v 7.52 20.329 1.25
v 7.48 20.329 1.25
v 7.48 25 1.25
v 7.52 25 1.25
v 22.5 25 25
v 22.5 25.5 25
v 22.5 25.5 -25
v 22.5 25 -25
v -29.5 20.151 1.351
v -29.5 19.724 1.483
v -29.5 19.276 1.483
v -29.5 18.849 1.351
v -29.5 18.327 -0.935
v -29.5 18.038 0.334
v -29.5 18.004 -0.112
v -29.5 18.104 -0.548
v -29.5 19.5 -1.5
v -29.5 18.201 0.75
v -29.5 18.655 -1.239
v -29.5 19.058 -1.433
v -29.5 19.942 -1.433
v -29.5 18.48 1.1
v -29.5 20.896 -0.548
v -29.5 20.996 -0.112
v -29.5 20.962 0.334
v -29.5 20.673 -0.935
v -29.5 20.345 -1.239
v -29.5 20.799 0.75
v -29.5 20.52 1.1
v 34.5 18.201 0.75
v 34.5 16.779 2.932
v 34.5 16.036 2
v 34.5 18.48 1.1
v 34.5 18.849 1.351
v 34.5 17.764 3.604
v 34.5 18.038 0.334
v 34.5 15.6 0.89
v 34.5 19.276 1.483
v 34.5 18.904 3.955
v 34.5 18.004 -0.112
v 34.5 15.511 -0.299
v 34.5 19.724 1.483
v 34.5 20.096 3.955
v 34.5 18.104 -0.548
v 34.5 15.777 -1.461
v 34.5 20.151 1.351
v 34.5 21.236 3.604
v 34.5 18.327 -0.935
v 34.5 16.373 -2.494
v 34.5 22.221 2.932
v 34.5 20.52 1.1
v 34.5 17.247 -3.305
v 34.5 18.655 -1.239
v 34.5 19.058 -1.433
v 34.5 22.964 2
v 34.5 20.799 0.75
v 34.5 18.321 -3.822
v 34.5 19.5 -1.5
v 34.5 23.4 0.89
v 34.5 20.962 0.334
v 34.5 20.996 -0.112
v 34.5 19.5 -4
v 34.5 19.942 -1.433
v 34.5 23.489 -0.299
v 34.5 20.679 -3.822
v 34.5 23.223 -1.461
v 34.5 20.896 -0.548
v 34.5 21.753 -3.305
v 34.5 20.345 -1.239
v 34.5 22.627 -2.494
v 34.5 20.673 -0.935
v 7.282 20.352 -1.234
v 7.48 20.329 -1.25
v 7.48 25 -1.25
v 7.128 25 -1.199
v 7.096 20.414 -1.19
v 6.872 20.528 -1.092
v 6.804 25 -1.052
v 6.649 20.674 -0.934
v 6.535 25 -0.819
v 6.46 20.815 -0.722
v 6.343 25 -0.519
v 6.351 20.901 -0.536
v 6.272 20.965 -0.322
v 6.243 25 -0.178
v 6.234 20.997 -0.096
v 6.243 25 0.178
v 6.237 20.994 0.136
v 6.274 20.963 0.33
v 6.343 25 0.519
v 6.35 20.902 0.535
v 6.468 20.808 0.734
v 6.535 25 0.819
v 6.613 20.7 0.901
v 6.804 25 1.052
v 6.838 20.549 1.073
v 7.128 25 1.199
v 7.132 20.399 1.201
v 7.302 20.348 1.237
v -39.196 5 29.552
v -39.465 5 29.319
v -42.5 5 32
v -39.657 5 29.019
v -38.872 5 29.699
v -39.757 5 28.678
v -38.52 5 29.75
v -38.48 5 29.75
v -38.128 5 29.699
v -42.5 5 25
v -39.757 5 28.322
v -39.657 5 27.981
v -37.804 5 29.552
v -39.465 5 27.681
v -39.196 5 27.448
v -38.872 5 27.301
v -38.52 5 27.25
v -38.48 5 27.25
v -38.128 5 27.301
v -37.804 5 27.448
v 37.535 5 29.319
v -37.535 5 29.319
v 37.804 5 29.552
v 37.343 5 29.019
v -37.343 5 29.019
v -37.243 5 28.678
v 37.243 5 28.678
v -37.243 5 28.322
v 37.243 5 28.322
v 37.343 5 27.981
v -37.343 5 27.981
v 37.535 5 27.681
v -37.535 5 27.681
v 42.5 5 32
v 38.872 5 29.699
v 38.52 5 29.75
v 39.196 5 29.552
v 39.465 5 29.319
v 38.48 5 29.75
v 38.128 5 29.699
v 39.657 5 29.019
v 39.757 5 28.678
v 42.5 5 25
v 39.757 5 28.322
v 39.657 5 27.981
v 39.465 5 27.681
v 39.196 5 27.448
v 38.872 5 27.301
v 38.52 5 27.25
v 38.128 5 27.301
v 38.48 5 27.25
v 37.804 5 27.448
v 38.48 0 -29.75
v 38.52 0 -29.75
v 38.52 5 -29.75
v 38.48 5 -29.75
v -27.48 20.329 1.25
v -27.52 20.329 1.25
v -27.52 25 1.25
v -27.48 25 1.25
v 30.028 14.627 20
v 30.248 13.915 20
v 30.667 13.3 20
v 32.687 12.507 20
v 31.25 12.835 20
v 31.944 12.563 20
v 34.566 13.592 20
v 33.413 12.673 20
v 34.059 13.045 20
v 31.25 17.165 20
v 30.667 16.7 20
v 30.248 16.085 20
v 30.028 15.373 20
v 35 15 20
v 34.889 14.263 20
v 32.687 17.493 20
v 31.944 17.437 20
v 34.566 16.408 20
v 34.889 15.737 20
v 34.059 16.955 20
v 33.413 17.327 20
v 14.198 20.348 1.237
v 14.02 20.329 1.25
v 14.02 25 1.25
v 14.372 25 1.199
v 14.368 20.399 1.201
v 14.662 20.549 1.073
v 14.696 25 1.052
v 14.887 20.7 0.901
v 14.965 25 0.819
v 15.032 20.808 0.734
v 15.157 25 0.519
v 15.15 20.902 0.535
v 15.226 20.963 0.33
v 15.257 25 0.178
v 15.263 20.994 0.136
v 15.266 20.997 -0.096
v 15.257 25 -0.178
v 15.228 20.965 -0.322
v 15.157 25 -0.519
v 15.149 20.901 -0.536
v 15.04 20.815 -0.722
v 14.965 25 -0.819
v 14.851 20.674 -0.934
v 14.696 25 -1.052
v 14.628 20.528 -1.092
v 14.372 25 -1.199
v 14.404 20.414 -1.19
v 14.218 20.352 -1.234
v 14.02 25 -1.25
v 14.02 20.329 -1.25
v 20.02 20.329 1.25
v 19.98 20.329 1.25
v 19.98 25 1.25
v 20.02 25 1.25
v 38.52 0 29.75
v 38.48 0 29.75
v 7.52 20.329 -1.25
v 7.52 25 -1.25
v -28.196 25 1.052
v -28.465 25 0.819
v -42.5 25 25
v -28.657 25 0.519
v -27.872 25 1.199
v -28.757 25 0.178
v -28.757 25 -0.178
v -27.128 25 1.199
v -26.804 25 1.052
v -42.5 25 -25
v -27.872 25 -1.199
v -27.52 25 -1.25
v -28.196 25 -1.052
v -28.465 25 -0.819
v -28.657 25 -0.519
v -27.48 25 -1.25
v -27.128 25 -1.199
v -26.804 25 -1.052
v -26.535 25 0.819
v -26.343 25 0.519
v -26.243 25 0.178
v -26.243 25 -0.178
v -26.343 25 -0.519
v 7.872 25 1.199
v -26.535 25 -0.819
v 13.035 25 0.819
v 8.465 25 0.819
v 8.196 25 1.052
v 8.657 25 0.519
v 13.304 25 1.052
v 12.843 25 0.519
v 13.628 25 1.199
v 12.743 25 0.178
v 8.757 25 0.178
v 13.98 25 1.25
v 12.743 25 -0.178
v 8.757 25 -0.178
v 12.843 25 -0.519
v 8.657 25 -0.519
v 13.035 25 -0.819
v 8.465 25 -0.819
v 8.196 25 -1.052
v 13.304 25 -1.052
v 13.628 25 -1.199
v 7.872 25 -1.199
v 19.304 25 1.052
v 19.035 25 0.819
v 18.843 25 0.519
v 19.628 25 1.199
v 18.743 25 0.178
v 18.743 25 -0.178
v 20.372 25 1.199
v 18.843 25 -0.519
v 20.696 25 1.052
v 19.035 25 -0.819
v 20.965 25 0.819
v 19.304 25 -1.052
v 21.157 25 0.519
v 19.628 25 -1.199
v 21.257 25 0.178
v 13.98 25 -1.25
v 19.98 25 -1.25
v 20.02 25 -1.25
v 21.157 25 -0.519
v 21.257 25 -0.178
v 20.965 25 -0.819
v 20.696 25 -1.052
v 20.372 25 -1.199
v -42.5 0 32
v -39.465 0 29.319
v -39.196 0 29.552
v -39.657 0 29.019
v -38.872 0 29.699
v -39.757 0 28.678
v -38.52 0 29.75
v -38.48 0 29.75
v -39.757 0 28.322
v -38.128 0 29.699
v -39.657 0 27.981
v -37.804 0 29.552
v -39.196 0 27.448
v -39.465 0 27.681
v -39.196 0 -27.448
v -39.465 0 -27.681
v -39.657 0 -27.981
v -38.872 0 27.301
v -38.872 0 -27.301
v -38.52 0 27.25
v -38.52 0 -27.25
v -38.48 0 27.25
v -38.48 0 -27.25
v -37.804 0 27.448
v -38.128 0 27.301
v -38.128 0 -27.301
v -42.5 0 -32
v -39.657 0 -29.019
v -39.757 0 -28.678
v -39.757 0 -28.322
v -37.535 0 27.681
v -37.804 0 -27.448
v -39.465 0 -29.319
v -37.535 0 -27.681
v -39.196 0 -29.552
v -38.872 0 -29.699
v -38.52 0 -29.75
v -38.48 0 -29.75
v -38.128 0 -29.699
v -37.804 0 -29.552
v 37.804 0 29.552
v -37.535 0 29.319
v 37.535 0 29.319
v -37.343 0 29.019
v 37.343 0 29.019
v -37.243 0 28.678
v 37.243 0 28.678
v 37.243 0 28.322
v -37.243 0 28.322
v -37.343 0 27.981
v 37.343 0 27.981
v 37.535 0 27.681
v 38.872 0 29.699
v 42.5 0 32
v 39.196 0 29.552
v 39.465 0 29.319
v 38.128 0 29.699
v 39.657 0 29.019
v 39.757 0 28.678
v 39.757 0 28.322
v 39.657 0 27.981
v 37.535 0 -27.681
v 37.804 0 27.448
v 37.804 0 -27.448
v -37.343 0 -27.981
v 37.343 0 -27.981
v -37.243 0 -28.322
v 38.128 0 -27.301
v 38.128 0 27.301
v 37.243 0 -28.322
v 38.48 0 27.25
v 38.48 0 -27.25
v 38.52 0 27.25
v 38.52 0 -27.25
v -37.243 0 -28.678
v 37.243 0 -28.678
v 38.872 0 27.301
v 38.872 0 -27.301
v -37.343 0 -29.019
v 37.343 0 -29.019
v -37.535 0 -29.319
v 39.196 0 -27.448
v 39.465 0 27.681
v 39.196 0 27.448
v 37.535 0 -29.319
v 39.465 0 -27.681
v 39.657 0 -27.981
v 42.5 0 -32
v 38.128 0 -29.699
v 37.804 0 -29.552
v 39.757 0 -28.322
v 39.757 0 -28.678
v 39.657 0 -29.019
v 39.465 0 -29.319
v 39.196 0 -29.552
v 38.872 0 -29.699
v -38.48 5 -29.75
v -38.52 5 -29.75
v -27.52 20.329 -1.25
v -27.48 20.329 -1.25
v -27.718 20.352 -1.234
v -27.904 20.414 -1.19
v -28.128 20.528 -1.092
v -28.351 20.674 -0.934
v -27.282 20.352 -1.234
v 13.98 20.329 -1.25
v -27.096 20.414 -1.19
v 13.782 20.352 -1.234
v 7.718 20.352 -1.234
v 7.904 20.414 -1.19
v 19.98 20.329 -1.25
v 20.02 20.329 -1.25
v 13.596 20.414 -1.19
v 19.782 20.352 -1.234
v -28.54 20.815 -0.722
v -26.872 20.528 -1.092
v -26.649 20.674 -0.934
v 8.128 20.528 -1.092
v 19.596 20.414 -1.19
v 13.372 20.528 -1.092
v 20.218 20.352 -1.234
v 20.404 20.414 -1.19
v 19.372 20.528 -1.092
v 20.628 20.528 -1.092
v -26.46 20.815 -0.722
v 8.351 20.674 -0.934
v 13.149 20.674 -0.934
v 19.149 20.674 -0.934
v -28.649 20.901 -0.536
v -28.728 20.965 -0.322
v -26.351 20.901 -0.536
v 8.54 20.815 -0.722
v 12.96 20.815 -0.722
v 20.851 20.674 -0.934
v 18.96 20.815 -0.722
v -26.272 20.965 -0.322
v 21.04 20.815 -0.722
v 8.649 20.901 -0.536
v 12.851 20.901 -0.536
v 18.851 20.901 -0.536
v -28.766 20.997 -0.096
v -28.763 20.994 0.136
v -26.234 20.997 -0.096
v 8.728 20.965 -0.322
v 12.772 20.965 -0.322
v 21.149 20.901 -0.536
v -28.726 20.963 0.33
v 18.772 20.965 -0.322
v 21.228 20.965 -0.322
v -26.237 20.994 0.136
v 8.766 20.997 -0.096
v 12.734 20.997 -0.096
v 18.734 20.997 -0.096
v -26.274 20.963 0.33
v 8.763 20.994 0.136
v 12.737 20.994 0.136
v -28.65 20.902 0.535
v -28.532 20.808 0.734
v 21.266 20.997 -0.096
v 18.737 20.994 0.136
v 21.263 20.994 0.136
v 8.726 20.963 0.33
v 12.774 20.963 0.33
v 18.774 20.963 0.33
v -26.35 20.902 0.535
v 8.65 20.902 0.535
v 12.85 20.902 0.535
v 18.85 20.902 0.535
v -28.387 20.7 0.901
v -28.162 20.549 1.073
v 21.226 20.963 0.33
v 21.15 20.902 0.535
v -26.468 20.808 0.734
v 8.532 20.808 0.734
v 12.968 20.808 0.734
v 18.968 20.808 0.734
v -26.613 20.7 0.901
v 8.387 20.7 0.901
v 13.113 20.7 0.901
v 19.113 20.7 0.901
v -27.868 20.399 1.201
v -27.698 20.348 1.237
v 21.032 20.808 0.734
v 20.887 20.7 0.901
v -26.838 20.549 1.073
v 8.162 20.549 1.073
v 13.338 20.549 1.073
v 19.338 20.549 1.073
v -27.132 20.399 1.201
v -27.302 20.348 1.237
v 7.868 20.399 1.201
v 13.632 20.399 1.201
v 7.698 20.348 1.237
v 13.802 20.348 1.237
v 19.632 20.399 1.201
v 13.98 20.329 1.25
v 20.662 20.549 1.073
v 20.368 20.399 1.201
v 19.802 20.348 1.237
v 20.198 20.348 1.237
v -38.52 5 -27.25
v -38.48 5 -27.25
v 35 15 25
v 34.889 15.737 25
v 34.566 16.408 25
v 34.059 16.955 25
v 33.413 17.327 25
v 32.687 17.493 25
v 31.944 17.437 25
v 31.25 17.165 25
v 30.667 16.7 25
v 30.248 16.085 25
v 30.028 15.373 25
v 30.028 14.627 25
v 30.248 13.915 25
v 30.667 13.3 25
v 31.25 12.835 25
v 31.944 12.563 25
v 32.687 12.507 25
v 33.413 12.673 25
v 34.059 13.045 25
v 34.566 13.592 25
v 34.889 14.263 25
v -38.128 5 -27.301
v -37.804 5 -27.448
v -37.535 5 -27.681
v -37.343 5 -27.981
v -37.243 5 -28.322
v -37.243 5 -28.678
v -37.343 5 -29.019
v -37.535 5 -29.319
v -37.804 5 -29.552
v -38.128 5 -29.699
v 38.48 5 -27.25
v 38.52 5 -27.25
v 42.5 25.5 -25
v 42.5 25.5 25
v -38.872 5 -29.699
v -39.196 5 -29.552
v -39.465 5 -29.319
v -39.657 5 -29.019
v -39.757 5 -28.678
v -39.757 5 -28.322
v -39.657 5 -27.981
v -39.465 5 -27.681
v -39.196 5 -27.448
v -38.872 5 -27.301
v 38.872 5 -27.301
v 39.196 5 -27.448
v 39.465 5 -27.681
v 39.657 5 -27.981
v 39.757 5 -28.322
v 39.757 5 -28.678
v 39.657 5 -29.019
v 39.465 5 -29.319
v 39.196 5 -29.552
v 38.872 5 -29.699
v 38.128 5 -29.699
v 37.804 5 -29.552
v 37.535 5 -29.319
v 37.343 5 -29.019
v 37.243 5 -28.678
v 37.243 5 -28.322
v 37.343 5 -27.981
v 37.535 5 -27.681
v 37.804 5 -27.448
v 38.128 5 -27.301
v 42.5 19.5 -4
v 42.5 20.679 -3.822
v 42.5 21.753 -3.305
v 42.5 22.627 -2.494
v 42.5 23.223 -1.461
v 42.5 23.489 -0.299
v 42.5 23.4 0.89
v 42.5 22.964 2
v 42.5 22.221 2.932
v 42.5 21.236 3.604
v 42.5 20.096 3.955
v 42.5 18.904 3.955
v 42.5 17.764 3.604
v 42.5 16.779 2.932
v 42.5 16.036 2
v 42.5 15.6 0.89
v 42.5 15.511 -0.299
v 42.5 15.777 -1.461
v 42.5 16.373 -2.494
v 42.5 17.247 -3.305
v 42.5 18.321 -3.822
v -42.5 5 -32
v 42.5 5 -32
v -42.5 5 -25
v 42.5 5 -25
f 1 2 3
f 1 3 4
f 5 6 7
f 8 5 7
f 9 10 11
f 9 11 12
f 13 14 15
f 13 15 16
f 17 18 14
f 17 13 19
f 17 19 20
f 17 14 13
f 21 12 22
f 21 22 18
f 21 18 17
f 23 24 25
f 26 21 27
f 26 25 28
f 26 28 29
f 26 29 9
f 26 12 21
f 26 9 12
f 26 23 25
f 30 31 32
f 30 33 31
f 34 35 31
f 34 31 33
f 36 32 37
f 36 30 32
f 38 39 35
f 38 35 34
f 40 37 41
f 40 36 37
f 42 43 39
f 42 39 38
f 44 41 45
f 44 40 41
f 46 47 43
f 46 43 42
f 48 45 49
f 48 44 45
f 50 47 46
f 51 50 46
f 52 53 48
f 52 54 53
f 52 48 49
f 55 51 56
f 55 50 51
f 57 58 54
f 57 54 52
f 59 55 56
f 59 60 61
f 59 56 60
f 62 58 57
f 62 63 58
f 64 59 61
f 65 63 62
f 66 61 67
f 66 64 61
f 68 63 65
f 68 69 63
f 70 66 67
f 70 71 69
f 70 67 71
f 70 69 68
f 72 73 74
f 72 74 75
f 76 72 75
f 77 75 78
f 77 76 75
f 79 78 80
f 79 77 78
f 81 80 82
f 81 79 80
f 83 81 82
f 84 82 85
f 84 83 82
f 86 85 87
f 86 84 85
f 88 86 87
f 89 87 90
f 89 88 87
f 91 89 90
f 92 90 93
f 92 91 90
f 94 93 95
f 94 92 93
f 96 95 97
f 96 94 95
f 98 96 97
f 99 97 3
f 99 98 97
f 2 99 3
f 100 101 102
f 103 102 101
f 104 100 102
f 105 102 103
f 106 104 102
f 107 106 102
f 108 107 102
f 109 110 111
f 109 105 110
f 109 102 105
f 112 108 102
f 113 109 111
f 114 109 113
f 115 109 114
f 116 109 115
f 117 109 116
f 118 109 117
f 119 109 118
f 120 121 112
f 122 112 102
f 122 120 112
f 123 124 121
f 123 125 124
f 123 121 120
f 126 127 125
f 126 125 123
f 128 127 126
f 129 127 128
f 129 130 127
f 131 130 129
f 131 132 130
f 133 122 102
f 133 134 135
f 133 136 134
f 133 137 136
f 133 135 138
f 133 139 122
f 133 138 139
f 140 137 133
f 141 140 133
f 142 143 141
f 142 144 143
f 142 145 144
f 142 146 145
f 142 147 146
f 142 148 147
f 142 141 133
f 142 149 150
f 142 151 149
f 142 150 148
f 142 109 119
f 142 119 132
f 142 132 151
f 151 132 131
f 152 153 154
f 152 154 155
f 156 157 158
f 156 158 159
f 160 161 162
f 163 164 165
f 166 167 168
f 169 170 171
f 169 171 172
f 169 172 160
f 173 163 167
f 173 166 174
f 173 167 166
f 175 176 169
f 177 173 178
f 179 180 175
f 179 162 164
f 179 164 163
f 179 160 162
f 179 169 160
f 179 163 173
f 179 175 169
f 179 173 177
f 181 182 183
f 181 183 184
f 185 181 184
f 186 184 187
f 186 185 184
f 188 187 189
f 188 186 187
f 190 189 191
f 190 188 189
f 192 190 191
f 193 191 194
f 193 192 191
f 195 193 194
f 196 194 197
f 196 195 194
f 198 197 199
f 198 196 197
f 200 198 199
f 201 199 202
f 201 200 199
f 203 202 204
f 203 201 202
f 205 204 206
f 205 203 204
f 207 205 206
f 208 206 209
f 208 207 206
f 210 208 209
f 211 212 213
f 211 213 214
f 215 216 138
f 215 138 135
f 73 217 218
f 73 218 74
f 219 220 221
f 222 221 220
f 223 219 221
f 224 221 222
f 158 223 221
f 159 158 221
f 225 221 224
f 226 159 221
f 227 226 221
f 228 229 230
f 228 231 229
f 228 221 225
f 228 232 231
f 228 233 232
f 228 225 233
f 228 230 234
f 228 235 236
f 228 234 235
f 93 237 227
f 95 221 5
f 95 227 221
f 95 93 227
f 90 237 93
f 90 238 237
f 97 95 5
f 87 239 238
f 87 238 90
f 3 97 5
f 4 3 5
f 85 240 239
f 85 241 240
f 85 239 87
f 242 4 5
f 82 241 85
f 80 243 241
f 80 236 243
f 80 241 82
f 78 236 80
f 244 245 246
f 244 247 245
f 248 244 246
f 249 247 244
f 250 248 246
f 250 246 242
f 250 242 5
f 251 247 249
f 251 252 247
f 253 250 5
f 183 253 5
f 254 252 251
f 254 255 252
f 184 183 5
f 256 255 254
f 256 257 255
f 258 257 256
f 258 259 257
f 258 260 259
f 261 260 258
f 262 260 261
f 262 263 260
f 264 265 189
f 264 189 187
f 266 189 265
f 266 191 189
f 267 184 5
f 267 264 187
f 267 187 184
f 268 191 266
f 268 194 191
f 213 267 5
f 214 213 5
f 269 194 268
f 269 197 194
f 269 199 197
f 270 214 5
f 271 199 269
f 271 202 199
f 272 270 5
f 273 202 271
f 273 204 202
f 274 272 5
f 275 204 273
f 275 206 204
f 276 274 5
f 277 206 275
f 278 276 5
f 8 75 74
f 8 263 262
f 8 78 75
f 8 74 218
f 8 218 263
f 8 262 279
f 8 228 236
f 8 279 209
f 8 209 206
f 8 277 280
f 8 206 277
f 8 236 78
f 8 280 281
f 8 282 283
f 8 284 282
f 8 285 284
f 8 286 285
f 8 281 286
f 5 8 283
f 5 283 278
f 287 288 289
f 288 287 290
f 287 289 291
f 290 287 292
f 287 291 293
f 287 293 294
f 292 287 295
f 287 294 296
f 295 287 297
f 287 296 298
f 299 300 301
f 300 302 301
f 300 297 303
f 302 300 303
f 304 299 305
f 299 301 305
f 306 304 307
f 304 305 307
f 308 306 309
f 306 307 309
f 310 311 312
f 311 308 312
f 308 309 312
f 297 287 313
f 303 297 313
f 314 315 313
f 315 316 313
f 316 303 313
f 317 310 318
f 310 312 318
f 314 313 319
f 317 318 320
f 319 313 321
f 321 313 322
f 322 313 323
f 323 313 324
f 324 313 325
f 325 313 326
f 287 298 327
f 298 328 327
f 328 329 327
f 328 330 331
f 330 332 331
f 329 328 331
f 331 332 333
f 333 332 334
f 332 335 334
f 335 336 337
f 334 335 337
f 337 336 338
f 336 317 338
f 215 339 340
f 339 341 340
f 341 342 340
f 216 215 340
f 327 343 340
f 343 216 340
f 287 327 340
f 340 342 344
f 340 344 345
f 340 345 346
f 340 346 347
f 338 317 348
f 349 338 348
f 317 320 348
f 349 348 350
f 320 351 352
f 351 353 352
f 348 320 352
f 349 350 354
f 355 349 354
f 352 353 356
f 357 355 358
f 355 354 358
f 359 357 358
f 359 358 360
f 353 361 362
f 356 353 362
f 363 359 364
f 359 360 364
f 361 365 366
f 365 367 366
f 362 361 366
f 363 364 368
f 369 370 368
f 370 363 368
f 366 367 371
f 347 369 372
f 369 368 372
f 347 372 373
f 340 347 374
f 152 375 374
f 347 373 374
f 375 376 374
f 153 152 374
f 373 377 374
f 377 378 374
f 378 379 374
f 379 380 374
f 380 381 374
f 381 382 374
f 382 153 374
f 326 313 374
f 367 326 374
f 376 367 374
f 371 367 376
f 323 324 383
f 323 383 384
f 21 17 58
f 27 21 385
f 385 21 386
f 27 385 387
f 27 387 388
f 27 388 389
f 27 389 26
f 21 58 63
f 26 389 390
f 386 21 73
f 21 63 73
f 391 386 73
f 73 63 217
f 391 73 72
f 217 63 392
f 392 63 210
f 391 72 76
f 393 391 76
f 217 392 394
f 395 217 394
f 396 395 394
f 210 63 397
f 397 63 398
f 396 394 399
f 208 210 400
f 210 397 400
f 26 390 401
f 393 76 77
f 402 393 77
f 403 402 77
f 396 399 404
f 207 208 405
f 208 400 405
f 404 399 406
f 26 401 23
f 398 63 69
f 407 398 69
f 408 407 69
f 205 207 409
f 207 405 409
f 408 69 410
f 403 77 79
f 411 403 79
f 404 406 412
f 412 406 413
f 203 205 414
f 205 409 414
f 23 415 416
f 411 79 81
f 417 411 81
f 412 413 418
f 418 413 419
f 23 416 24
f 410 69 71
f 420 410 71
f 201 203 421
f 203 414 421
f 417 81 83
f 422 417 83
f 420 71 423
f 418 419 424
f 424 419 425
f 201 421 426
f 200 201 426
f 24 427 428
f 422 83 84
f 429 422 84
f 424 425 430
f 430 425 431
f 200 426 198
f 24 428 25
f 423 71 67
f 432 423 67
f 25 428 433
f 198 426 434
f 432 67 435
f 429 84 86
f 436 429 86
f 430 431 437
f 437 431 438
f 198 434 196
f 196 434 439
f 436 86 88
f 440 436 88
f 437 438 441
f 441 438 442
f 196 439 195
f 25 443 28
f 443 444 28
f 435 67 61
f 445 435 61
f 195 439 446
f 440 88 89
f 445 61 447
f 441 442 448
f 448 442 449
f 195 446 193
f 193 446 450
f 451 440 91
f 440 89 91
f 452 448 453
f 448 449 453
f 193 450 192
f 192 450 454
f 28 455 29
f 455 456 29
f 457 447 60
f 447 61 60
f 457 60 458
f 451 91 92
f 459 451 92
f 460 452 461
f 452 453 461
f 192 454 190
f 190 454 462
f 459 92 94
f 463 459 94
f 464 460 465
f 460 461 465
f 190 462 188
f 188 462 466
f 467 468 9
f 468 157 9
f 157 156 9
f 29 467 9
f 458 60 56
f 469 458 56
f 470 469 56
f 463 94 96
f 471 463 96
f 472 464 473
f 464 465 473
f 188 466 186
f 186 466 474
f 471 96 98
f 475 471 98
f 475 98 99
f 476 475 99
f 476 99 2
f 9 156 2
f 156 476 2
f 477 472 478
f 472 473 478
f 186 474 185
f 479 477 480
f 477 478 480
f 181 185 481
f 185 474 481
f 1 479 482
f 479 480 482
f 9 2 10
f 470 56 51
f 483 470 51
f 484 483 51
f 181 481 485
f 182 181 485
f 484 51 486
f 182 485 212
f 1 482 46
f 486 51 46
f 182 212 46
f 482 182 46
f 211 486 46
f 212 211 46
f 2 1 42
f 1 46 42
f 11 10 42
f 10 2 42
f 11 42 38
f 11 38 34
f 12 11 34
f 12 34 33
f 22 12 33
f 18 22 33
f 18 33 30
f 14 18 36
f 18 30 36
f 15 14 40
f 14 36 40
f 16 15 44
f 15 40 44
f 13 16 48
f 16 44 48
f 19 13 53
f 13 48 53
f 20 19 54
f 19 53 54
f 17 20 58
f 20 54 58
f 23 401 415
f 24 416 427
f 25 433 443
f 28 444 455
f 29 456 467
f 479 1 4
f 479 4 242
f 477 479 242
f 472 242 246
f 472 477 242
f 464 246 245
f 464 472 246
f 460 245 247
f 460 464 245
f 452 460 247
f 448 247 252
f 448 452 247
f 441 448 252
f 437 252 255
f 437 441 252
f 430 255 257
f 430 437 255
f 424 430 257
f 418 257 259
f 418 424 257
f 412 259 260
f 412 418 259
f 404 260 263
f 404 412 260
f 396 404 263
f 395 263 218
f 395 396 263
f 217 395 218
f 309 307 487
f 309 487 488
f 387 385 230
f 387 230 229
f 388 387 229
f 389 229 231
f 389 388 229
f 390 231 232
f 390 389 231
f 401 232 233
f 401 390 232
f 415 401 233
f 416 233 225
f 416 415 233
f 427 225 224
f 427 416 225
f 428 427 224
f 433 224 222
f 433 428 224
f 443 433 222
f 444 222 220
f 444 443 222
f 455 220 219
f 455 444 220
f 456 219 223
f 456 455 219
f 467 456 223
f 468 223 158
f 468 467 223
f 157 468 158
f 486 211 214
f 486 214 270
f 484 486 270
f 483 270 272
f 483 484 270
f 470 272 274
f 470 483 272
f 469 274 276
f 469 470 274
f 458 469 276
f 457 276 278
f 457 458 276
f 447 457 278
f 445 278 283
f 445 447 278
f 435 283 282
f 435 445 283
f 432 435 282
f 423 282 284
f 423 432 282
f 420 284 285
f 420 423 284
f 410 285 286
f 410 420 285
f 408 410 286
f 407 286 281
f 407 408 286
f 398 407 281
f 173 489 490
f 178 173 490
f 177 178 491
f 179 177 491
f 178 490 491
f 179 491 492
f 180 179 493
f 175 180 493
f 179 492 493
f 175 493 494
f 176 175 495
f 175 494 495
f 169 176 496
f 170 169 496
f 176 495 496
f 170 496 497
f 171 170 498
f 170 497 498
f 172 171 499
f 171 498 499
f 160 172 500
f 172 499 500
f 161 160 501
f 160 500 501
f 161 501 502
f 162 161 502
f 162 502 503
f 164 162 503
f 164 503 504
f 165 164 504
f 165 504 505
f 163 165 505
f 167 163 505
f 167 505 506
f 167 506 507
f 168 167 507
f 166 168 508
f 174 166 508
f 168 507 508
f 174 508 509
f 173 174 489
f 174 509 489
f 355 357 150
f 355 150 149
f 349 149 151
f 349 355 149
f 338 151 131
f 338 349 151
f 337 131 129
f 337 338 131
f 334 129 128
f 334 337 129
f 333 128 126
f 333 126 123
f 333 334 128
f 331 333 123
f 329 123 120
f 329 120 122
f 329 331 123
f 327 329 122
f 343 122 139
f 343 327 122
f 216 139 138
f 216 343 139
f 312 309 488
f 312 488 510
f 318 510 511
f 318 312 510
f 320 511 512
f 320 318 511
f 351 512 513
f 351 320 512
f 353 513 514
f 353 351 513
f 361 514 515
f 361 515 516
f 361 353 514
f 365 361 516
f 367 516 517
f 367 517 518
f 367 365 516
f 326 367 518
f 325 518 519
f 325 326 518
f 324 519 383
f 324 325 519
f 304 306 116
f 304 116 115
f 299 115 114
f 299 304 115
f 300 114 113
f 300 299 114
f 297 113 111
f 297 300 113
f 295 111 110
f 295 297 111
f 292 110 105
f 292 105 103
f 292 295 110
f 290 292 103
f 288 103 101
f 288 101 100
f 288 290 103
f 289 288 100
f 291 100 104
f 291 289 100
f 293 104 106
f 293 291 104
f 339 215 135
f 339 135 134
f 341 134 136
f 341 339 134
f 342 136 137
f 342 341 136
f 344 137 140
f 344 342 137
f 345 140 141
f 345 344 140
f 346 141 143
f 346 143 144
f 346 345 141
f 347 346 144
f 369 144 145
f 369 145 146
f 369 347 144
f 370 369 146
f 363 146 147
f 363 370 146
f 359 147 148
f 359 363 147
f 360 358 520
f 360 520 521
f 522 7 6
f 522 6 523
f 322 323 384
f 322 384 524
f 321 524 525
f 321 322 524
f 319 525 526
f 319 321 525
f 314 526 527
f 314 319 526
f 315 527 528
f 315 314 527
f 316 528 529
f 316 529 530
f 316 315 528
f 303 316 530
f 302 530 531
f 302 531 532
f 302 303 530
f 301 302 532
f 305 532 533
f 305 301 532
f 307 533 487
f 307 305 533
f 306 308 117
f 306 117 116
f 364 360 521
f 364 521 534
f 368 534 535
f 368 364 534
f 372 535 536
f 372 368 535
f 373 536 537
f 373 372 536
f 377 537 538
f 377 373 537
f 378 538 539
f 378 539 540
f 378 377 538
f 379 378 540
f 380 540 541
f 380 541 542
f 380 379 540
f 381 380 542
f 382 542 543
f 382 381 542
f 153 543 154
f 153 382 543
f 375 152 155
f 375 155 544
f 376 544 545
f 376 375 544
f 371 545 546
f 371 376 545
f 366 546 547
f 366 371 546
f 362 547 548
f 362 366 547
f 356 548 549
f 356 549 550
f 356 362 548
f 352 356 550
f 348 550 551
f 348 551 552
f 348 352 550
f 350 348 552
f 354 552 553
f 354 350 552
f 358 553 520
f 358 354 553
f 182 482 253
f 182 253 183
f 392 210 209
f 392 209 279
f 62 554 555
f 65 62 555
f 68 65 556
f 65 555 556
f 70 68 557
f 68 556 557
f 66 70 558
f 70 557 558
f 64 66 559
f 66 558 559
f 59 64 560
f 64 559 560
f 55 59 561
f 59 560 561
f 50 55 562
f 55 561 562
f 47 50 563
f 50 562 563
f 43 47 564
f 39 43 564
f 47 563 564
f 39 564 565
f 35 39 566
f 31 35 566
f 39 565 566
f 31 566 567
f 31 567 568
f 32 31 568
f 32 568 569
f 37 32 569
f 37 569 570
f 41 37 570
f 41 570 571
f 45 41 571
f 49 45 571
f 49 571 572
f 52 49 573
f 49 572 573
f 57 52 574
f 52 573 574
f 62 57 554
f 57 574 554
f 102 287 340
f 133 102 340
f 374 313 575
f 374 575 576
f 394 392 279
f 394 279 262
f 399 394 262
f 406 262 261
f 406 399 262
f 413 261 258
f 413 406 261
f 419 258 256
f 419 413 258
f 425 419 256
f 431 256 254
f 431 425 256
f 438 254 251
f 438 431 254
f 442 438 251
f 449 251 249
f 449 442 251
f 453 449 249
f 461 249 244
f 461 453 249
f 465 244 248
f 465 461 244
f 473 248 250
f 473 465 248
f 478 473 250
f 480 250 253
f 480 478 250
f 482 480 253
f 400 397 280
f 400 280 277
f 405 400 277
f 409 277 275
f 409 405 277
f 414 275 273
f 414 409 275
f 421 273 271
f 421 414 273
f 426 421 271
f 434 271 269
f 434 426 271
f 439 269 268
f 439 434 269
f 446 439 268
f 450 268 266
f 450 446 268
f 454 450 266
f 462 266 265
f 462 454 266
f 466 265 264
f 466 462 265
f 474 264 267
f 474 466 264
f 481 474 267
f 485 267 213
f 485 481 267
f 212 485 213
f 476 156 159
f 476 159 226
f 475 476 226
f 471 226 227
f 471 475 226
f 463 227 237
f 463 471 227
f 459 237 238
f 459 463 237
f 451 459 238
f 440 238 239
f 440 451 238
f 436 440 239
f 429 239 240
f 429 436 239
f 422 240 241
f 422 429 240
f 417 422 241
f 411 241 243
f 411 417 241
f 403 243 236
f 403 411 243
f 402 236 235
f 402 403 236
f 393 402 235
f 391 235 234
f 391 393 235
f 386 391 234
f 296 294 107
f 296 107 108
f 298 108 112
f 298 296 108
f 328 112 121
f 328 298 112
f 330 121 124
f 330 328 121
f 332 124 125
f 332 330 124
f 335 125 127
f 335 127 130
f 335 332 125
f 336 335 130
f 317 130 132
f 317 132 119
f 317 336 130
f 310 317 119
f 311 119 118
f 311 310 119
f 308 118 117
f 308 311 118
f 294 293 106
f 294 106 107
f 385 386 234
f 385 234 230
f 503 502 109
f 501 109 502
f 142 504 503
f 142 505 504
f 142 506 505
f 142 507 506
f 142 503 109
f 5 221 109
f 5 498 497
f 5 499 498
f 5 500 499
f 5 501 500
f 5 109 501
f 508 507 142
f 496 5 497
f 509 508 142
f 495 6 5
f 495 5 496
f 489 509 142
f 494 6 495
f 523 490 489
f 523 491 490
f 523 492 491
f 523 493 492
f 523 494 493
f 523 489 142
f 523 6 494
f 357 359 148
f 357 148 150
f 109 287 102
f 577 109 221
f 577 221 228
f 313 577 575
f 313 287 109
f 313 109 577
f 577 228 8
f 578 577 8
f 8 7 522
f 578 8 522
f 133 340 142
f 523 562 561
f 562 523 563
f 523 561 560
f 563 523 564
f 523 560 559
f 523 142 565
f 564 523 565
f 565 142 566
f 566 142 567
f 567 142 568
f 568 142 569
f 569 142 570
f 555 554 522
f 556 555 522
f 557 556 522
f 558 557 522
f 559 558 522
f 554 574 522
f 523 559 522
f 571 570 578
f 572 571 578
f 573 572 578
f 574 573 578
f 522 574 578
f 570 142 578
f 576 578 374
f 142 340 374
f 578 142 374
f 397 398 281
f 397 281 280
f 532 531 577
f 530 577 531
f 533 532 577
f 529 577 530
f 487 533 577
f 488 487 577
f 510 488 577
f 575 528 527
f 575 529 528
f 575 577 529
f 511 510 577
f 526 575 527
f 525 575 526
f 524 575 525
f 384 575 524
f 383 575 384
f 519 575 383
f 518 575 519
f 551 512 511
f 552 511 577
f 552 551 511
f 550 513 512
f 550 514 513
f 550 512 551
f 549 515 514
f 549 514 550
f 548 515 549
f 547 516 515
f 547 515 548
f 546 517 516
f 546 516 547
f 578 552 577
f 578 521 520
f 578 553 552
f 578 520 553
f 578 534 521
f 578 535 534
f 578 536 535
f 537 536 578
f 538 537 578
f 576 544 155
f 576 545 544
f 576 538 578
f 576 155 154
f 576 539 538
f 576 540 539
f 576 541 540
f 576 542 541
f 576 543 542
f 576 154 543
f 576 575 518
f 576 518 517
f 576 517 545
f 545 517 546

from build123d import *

# Parameters (mm, degrees)
SKETCH1_W                            = 85
SKETCH1_H                            = 64
BOSS_EXTRUDE1_DEPTH                  = 25.5
SKETCH2_W                            = 85
SKETCH2_H                            = 7
CUT_EXTRUDE1_DEPTH                   = 20.5
SKETCH3_W                            = 65
SKETCH3_H                            = 50
CUT_EXTRUDE2_DEPTH                   = 0.5
SKETCH4_R                            = 2.5
CUT_EXTRUDE3_DEPTH                   = 5
SKETCH5_R                            = 4
CUT_EXTRUDE4_DEPTH                   = 8
SKETCH6_R                            = 1.5
CUT_EXTRUDE5_DEPTH                   = 64
TAP_DRILL_SLOT_FOR_M3X0_5_TAP2_DEPTH = 5
TAP_START                            = 20.329155487
TAP_DRILL_SLOT_FOR_M3X0_5_TAP1_DEPTH = 4.670844513


# Read off the part's stored shape, not the designer's step: Tap Drill Slot for M3x0.5 Tap2, Tap Drill Slot for M3x0.5 Tap1
with BuildPart() as part:
    # Sketch1 → Boss-Extrude1 (new body)
    with BuildSketch(Plane(origin=(0, 0, 0), x_dir=(1, 0, 0), z_dir=(0, 1, 0))):
        Rectangle(SKETCH1_W, SKETCH1_H)
    extrude(amount=BOSS_EXTRUDE1_DEPTH)

    # Sketch2 → Cut-Extrude1 (cut)
    with BuildSketch(Plane(origin=(0, 25.5, 0), x_dir=(1, 0, 0), z_dir=(0, 1, 0))):
        with Locations((0, 28.5)):
            Rectangle(SKETCH2_W, SKETCH2_H)
        with Locations((0, -28.5)):
            Rectangle(SKETCH2_W, SKETCH2_H)
    extrude(amount=-CUT_EXTRUDE1_DEPTH, mode=Mode.SUBTRACT)

    # Sketch3 → Cut-Extrude2 (cut)
    with BuildSketch(Plane(origin=(0, 25.5, 0), x_dir=(1, 0, 0), z_dir=(0, 1, 0))):
        with Locations((-10, 0)):
            Rectangle(SKETCH3_W, SKETCH3_H)
    extrude(amount=-CUT_EXTRUDE2_DEPTH, mode=Mode.SUBTRACT)

    # Sketch4 → Cut-Extrude3 (cut)
    with BuildSketch(Plane.XY.offset(25)):
        with Locations((32.5, 15)):
            Circle(SKETCH4_R)
    extrude(amount=-CUT_EXTRUDE3_DEPTH, mode=Mode.SUBTRACT)

    # Sketch5 → Cut-Extrude4 (cut)
    with BuildSketch(Plane(origin=(42.5, 0, 0), x_dir=(0, 0, -1), z_dir=(1, 0, 0))):
        with Locations((0, 19.5)):
            Circle(SKETCH5_R)
    extrude(amount=-CUT_EXTRUDE4_DEPTH, mode=Mode.SUBTRACT)

    # Sketch6 → Cut-Extrude5 (cut)
    with BuildSketch(Plane(origin=(34.5, 0, 0), x_dir=(0, 0, -1), z_dir=(1, 0, 0))):
        with Locations((0, 19.5)):
            Circle(SKETCH6_R)
    extrude(amount=-CUT_EXTRUDE5_DEPTH, mode=Mode.SUBTRACT)

    # Tap Drill Slot for M3x0.5 Tap2 outline → Tap Drill Slot for M3x0.5 Tap2 (cut)
    with BuildSketch(Plane(origin=(0, 0, 0), x_dir=(1, 0, 0), z_dir=(0, 1, 0))):
        with BuildLine():
            Line((-38.52, -29.75), (-38.48, -29.75))
            ThreePointArc((-38.48, -29.75), (-37.23, -28.5), (-38.48, -27.25))
            Line((-38.48, -27.25), (-38.52, -27.25))
            ThreePointArc((-38.52, -27.25), (-39.77, -28.5), (-38.52, -29.75))
        make_face()
        with BuildLine():
            ThreePointArc((38.52, -29.75), (39.77, -28.5), (38.52, -27.25))
            Line((38.52, -27.25), (38.48, -27.25))
            ThreePointArc((38.48, -27.25), (37.23, -28.5), (38.48, -29.75))
            Line((38.48, -29.75), (38.52, -29.75))
        make_face()
        with BuildLine():
            Line((38.48, 27.25), (38.52, 27.25))
            ThreePointArc((38.52, 27.25), (39.77, 28.5), (38.52, 29.75))
            Line((38.52, 29.75), (38.48, 29.75))
            ThreePointArc((38.48, 29.75), (37.23, 28.5), (38.48, 27.25))
        make_face()
        with BuildLine():
            ThreePointArc((-38.48, 27.25), (-37.23, 28.5), (-38.48, 29.75))
            Line((-38.48, 29.75), (-38.52, 29.75))
            ThreePointArc((-38.52, 29.75), (-39.77, 28.5), (-38.52, 27.25))
            Line((-38.52, 27.25), (-38.48, 27.25))
        make_face()
    extrude(amount=TAP_DRILL_SLOT_FOR_M3X0_5_TAP2_DEPTH, mode=Mode.SUBTRACT)

    # Tap Drill Slot for M3x0.5 Tap1 outline → Tap Drill Slot for M3x0.5 Tap1 (cut)
    with BuildSketch(Plane(origin=(0, 0, 0), x_dir=(1, 0, 0), z_dir=(0, 1, 0)).offset(TAP_START)):
        with BuildLine():
            ThreePointArc((19.98, 1.25), (18.73, 0), (19.98, -1.25))
            Line((19.98, -1.25), (20.02, -1.25))
            ThreePointArc((20.02, -1.25), (21.27, 0), (20.02, 1.25))
            Line((20.02, 1.25), (19.98, 1.25))
        make_face()
        with BuildLine():
            ThreePointArc((13.98, 1.25), (12.73, 0), (13.98, -1.25))
            Line((13.98, -1.25), (14.02, -1.25))
            ThreePointArc((14.02, -1.25), (15.27, 0), (14.02, 1.25))
            Line((14.02, 1.25), (13.98, 1.25))
        make_face()
        with BuildLine():
            ThreePointArc((7.48, 1.25), (6.23, 0), (7.48, -1.25))
            Line((7.48, -1.25), (7.52, -1.25))
            ThreePointArc((7.52, -1.25), (8.77, 0), (7.52, 1.25))
            Line((7.52, 1.25), (7.48, 1.25))
        make_face()
        with BuildLine():
            ThreePointArc((-27.52, 1.25), (-28.77, 0), (-27.52, -1.25))
            Line((-27.52, -1.25), (-27.48, -1.25))
            ThreePointArc((-27.48, -1.25), (-26.23, 0), (-27.48, 1.25))
            Line((-27.48, 1.25), (-27.52, 1.25))
        make_face()
    extrude(amount=TAP_DRILL_SLOT_FOR_M3X0_5_TAP1_DEPTH, mode=Mode.SUBTRACT)


solid = part.part
